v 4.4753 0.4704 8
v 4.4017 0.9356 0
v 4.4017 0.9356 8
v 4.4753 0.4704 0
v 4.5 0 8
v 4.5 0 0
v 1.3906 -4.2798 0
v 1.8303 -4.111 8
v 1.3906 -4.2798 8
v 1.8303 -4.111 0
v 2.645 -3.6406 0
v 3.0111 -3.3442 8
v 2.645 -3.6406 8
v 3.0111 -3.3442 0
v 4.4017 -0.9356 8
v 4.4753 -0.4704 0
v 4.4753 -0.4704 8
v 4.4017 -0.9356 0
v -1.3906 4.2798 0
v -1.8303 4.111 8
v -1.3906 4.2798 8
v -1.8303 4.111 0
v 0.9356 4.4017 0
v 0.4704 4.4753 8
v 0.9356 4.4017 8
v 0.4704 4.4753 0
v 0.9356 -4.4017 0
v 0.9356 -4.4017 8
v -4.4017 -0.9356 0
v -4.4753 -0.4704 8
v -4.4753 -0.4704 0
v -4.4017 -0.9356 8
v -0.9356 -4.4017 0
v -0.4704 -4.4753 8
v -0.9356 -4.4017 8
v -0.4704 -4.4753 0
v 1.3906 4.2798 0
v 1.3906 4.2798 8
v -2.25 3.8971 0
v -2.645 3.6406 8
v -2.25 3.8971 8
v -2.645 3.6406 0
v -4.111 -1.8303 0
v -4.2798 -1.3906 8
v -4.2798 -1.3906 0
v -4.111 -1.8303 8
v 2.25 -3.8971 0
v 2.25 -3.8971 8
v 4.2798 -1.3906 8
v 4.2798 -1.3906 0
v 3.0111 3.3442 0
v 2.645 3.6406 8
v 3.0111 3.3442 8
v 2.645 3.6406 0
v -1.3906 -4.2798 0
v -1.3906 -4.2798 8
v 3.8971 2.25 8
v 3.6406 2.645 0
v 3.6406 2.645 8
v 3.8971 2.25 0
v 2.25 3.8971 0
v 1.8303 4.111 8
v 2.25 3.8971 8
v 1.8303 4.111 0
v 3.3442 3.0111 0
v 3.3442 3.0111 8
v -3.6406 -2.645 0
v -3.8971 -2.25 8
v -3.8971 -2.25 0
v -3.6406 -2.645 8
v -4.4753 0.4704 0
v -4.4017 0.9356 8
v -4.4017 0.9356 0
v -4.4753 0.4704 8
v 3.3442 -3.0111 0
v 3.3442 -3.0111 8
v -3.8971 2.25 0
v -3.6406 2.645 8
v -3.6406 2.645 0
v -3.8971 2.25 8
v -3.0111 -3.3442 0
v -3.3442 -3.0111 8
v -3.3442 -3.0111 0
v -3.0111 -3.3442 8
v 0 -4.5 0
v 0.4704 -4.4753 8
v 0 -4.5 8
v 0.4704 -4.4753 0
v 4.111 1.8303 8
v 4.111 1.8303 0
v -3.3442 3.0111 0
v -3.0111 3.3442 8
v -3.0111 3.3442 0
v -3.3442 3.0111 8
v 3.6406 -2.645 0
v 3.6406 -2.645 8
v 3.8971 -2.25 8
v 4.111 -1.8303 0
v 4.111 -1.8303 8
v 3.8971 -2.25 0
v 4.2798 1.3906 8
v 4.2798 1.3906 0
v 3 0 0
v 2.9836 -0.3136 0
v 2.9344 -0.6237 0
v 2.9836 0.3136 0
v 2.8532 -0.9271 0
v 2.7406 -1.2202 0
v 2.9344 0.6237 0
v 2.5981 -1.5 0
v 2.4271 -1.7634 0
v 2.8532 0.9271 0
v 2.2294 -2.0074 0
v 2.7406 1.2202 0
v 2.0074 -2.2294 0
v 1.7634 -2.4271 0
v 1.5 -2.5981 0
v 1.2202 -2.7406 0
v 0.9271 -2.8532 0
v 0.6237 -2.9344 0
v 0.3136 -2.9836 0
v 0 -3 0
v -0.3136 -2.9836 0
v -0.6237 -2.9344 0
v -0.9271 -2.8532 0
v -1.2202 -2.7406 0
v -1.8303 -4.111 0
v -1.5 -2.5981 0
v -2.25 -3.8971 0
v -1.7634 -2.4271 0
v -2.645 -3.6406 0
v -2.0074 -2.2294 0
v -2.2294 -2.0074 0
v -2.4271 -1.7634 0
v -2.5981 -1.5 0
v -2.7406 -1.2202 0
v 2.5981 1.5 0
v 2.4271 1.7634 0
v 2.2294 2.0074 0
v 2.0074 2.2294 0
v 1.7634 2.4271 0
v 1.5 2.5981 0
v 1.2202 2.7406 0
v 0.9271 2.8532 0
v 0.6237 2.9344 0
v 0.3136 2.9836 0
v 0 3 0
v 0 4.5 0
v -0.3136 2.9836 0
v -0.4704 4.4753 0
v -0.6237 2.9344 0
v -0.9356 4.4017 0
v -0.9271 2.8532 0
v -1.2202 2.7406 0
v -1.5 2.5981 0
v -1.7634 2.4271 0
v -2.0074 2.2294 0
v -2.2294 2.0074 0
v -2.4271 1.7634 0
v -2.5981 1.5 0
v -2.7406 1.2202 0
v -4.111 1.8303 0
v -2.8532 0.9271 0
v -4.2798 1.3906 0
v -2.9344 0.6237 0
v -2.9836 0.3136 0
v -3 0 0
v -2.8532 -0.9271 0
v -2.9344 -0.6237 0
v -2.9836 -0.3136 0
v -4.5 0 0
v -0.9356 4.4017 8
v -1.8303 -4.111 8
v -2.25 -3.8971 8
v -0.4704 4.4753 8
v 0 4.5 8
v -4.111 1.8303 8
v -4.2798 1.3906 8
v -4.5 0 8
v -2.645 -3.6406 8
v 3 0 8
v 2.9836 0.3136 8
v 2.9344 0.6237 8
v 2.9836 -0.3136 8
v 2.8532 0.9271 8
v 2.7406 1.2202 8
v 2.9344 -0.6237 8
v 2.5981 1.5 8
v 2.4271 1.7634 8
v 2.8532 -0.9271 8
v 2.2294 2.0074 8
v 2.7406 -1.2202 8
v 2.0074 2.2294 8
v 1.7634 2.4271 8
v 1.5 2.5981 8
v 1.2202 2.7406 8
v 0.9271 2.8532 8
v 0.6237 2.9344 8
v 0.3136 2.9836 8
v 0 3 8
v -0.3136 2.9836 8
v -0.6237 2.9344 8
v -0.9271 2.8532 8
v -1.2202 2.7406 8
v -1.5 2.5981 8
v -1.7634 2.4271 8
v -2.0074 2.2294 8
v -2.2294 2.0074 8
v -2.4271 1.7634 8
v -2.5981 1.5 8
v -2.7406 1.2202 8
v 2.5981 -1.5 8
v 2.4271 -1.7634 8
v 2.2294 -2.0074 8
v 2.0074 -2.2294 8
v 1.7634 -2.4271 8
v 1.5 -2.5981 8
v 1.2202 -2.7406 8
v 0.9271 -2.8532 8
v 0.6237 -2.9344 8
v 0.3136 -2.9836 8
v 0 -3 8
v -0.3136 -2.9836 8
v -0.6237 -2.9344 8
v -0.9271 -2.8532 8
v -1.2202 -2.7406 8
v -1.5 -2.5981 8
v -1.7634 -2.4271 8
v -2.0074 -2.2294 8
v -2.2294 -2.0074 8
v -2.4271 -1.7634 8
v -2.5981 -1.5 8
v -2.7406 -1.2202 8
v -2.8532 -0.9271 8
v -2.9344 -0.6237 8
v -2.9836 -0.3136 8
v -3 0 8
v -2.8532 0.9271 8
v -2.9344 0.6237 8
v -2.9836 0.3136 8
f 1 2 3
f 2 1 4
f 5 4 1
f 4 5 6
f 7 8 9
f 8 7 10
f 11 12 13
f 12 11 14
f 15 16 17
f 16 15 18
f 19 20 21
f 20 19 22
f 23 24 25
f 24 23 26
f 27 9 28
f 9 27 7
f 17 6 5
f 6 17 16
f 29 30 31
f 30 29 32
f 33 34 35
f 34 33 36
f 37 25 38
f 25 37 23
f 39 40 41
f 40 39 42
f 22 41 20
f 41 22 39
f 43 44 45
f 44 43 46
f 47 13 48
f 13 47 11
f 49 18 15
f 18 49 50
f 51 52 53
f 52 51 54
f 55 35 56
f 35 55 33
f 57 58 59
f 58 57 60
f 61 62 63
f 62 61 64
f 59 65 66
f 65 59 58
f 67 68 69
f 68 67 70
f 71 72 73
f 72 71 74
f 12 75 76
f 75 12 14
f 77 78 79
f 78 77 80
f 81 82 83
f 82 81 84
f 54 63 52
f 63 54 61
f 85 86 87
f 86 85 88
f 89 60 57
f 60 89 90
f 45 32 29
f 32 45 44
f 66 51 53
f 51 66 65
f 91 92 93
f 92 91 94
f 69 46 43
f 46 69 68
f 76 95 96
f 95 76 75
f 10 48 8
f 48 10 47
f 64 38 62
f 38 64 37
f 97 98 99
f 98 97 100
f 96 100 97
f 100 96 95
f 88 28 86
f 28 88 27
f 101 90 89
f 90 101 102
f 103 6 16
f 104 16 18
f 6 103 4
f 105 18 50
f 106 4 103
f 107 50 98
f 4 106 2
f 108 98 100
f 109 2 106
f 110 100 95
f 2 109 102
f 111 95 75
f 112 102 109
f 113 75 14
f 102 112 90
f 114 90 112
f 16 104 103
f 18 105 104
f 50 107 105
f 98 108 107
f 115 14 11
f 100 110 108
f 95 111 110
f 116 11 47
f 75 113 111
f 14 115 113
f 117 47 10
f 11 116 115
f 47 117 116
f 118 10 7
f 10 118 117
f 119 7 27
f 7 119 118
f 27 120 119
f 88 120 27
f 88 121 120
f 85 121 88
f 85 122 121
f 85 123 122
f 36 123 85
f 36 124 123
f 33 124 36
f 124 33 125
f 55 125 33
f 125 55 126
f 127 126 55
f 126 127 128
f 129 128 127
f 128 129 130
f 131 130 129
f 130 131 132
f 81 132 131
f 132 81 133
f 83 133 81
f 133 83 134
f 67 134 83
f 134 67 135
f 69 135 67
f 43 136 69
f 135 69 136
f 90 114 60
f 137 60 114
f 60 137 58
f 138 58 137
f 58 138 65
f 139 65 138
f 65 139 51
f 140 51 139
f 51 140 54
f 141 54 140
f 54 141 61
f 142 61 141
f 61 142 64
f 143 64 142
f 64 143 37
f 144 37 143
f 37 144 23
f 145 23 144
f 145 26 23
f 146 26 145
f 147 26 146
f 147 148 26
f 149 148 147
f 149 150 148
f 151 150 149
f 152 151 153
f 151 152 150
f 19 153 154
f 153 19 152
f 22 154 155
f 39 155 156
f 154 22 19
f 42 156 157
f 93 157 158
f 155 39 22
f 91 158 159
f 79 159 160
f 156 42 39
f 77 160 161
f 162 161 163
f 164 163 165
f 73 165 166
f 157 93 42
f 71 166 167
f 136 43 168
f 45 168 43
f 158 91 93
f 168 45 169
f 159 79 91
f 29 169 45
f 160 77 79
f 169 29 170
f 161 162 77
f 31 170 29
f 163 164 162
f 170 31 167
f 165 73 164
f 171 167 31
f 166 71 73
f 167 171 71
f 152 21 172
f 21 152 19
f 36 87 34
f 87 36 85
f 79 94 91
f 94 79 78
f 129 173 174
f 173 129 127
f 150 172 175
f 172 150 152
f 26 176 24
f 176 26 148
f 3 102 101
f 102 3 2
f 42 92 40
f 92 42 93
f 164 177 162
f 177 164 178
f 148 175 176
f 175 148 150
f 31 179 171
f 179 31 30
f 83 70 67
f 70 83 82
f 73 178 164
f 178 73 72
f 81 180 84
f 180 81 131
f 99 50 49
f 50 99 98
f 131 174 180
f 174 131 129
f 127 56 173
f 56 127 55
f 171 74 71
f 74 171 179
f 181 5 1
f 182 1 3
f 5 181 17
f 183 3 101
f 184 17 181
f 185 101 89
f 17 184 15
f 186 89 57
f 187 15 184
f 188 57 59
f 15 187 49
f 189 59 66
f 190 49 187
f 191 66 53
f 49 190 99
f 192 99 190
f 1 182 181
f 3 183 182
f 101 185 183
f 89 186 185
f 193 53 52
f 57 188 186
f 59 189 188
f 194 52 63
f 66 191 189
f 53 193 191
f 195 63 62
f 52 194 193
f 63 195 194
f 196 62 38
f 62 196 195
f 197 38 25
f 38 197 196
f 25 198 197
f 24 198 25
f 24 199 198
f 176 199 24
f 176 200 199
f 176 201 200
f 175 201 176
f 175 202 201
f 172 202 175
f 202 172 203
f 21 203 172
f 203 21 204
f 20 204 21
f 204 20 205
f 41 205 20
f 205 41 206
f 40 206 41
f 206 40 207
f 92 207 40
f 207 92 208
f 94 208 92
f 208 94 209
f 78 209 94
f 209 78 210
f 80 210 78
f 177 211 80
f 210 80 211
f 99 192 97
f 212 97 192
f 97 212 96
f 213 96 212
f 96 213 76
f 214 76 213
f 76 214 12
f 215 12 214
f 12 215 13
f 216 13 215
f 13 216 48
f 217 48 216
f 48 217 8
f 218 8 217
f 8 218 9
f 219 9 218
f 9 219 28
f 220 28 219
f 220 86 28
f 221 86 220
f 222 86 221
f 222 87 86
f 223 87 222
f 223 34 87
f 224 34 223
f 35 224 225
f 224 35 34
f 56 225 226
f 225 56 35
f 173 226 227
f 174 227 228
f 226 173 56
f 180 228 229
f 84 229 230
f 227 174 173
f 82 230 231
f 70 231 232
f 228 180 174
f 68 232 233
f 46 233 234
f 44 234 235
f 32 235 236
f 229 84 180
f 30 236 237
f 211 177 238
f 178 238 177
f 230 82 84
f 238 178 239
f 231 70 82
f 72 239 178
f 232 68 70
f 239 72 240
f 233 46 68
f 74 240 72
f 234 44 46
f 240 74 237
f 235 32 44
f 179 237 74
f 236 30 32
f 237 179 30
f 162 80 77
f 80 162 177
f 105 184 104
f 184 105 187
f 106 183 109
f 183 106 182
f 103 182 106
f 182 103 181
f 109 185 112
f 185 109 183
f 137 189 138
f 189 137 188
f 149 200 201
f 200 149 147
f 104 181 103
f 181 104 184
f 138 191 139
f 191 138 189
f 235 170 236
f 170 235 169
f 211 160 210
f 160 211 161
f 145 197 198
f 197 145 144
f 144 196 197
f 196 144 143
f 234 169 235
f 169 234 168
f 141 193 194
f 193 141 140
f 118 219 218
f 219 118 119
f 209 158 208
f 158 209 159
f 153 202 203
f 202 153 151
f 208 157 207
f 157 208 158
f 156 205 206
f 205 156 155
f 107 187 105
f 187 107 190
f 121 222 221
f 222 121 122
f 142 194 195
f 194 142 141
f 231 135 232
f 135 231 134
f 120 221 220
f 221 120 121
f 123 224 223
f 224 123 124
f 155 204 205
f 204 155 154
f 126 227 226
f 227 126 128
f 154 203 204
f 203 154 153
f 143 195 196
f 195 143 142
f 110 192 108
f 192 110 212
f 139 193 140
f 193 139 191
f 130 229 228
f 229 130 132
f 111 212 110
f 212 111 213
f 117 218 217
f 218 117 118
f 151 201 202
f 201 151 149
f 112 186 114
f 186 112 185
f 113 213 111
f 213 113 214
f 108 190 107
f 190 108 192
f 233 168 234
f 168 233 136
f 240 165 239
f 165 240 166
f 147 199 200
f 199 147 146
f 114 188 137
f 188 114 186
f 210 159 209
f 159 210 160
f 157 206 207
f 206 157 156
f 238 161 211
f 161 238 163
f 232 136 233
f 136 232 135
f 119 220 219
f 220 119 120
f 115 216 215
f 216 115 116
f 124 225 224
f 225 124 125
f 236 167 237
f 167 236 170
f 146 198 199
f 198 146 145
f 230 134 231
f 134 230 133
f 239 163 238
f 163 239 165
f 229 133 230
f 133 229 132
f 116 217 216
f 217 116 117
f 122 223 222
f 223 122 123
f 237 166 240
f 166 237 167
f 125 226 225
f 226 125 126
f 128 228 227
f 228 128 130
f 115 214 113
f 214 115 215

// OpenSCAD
// file: parameters.scad
// Speaker enclosure parameters

// Spacing between hexagon shapes in degrees.
spacing = 0.3;

// Absolute amount of spacing between hexagons in mm.
spacingAbs = 1; // mm

// Length of short side of streched hexagon shapes in degrees.
shortSide = 1;

// Distance of streched hexagon side points in degrees
armsDistance = 0.575;

// Hexagon shape height in mm
hexLength = 26.666667;

// Height and length of an enclosure wall.
wallLength = 160;

// In between the hexagon shapes transparent and non-transparent layers alternate.
// Thickness of non-transparent material in between hexagon shapes in mm
solidThickness = 0.6;

// Thickness of transparent material in between hexagon shapes in mm
betweenThickness = 1.2;

// Thickness of hexagon shapes in mm
hexThickness = 7.2;


// Front wall speaker mounting screw holes
// screw hole diameter in mm
screwDiameter = 3.85;

// distance of screw hole from wall center point in mm
screwCenterDistance = 41.5;

// Front wall specific parameters
// Side length of rectangle used to create an indentation [mm].
frontRectLength = 95;

// Diameter of circle for front indentation [mm]
frontCircleDiameter = 103;

// Diameter of the speaker cone hole [mm].
speakerConeDiameter = 93;

// Side walls
// amount of overlapping on edges [mm]
sideEdgeFixWidth = 15;


// Back wall
// Diameter of the banana adapter [mm]
bananaAdapterDiameter = 5;

// Measures of the LED light adapter [mm]
ledAdapterHeight = 7.5;
ledAdapterWidth = 11;

// Distance from adapters to bottom edge [mm]
adapterEdgeDistance = 25;

// Distance between adapters [mm]
adapterDistance = 15;

// Speaker stand
// front width of stand
standWidth = wallLength * 0.9;

// length of speaker stand
standLength = wallLength * 0.9;

// size of the back piece that prevents the speaker from sliding of the stand [mm]
standRimWidth = 5;
standRimHeight = 8;

// max height of the stand [mm]
standHeight = 15;

// Front cover
// front cover thickness [mm]
coverThickness = 5;


/// LED Guide
// Distance from enclosure wall = spacing of strip to wall [mm]
guide_distance = 22.5;

// Thickness of the LED guide [mm]
guide_thickness = 1.5;

// Width of the LED guide [mm]
guide_width = 8;

// Length of one guide segment [mm]
guide_segment_length = 13;

// Length of the guide feet that get attached to the enclosure wall [mm]
guide_foot_length = 5;

// Number of total segments per LED guide
total_segments = 8;

// Width of the LED strip [mm]
led_strip_width = 10;

/// Back-side connectors
connector_length = 8;
connector_outer = 9;
connector_inner = 6;


/// Case
// wall thickness of the case [mm]
case_thickness = 1.2;

// inner case shell measurements [mm]
case_height = 22;
case_width = 85;
case_length = 90;

// diameter of the power connector hole [mm]
power_connector_diameter = 11;
power_connector_dist = 30;

// USB hole measurements [mm]
usb_width = 33;
usb_height = 18;
usb_dist = 3;

// LED connector measurements [mm]
led_connector_height = 8;
led_connector_width = 11;
led_connector_dist = 50;

// rounded case corners
case_bevel_diameter = 5;

case_connector_length = 5;
// main file
include <parameters.scad>;

$fn = 60;

module connector() {
    difference() {
        cylinder(connector_length, connector_outer / 2, connector_outer / 2);
        
        cylinder(connector_length, connector_inner / 2, connector_inner / 2);
    }
}

connector();
